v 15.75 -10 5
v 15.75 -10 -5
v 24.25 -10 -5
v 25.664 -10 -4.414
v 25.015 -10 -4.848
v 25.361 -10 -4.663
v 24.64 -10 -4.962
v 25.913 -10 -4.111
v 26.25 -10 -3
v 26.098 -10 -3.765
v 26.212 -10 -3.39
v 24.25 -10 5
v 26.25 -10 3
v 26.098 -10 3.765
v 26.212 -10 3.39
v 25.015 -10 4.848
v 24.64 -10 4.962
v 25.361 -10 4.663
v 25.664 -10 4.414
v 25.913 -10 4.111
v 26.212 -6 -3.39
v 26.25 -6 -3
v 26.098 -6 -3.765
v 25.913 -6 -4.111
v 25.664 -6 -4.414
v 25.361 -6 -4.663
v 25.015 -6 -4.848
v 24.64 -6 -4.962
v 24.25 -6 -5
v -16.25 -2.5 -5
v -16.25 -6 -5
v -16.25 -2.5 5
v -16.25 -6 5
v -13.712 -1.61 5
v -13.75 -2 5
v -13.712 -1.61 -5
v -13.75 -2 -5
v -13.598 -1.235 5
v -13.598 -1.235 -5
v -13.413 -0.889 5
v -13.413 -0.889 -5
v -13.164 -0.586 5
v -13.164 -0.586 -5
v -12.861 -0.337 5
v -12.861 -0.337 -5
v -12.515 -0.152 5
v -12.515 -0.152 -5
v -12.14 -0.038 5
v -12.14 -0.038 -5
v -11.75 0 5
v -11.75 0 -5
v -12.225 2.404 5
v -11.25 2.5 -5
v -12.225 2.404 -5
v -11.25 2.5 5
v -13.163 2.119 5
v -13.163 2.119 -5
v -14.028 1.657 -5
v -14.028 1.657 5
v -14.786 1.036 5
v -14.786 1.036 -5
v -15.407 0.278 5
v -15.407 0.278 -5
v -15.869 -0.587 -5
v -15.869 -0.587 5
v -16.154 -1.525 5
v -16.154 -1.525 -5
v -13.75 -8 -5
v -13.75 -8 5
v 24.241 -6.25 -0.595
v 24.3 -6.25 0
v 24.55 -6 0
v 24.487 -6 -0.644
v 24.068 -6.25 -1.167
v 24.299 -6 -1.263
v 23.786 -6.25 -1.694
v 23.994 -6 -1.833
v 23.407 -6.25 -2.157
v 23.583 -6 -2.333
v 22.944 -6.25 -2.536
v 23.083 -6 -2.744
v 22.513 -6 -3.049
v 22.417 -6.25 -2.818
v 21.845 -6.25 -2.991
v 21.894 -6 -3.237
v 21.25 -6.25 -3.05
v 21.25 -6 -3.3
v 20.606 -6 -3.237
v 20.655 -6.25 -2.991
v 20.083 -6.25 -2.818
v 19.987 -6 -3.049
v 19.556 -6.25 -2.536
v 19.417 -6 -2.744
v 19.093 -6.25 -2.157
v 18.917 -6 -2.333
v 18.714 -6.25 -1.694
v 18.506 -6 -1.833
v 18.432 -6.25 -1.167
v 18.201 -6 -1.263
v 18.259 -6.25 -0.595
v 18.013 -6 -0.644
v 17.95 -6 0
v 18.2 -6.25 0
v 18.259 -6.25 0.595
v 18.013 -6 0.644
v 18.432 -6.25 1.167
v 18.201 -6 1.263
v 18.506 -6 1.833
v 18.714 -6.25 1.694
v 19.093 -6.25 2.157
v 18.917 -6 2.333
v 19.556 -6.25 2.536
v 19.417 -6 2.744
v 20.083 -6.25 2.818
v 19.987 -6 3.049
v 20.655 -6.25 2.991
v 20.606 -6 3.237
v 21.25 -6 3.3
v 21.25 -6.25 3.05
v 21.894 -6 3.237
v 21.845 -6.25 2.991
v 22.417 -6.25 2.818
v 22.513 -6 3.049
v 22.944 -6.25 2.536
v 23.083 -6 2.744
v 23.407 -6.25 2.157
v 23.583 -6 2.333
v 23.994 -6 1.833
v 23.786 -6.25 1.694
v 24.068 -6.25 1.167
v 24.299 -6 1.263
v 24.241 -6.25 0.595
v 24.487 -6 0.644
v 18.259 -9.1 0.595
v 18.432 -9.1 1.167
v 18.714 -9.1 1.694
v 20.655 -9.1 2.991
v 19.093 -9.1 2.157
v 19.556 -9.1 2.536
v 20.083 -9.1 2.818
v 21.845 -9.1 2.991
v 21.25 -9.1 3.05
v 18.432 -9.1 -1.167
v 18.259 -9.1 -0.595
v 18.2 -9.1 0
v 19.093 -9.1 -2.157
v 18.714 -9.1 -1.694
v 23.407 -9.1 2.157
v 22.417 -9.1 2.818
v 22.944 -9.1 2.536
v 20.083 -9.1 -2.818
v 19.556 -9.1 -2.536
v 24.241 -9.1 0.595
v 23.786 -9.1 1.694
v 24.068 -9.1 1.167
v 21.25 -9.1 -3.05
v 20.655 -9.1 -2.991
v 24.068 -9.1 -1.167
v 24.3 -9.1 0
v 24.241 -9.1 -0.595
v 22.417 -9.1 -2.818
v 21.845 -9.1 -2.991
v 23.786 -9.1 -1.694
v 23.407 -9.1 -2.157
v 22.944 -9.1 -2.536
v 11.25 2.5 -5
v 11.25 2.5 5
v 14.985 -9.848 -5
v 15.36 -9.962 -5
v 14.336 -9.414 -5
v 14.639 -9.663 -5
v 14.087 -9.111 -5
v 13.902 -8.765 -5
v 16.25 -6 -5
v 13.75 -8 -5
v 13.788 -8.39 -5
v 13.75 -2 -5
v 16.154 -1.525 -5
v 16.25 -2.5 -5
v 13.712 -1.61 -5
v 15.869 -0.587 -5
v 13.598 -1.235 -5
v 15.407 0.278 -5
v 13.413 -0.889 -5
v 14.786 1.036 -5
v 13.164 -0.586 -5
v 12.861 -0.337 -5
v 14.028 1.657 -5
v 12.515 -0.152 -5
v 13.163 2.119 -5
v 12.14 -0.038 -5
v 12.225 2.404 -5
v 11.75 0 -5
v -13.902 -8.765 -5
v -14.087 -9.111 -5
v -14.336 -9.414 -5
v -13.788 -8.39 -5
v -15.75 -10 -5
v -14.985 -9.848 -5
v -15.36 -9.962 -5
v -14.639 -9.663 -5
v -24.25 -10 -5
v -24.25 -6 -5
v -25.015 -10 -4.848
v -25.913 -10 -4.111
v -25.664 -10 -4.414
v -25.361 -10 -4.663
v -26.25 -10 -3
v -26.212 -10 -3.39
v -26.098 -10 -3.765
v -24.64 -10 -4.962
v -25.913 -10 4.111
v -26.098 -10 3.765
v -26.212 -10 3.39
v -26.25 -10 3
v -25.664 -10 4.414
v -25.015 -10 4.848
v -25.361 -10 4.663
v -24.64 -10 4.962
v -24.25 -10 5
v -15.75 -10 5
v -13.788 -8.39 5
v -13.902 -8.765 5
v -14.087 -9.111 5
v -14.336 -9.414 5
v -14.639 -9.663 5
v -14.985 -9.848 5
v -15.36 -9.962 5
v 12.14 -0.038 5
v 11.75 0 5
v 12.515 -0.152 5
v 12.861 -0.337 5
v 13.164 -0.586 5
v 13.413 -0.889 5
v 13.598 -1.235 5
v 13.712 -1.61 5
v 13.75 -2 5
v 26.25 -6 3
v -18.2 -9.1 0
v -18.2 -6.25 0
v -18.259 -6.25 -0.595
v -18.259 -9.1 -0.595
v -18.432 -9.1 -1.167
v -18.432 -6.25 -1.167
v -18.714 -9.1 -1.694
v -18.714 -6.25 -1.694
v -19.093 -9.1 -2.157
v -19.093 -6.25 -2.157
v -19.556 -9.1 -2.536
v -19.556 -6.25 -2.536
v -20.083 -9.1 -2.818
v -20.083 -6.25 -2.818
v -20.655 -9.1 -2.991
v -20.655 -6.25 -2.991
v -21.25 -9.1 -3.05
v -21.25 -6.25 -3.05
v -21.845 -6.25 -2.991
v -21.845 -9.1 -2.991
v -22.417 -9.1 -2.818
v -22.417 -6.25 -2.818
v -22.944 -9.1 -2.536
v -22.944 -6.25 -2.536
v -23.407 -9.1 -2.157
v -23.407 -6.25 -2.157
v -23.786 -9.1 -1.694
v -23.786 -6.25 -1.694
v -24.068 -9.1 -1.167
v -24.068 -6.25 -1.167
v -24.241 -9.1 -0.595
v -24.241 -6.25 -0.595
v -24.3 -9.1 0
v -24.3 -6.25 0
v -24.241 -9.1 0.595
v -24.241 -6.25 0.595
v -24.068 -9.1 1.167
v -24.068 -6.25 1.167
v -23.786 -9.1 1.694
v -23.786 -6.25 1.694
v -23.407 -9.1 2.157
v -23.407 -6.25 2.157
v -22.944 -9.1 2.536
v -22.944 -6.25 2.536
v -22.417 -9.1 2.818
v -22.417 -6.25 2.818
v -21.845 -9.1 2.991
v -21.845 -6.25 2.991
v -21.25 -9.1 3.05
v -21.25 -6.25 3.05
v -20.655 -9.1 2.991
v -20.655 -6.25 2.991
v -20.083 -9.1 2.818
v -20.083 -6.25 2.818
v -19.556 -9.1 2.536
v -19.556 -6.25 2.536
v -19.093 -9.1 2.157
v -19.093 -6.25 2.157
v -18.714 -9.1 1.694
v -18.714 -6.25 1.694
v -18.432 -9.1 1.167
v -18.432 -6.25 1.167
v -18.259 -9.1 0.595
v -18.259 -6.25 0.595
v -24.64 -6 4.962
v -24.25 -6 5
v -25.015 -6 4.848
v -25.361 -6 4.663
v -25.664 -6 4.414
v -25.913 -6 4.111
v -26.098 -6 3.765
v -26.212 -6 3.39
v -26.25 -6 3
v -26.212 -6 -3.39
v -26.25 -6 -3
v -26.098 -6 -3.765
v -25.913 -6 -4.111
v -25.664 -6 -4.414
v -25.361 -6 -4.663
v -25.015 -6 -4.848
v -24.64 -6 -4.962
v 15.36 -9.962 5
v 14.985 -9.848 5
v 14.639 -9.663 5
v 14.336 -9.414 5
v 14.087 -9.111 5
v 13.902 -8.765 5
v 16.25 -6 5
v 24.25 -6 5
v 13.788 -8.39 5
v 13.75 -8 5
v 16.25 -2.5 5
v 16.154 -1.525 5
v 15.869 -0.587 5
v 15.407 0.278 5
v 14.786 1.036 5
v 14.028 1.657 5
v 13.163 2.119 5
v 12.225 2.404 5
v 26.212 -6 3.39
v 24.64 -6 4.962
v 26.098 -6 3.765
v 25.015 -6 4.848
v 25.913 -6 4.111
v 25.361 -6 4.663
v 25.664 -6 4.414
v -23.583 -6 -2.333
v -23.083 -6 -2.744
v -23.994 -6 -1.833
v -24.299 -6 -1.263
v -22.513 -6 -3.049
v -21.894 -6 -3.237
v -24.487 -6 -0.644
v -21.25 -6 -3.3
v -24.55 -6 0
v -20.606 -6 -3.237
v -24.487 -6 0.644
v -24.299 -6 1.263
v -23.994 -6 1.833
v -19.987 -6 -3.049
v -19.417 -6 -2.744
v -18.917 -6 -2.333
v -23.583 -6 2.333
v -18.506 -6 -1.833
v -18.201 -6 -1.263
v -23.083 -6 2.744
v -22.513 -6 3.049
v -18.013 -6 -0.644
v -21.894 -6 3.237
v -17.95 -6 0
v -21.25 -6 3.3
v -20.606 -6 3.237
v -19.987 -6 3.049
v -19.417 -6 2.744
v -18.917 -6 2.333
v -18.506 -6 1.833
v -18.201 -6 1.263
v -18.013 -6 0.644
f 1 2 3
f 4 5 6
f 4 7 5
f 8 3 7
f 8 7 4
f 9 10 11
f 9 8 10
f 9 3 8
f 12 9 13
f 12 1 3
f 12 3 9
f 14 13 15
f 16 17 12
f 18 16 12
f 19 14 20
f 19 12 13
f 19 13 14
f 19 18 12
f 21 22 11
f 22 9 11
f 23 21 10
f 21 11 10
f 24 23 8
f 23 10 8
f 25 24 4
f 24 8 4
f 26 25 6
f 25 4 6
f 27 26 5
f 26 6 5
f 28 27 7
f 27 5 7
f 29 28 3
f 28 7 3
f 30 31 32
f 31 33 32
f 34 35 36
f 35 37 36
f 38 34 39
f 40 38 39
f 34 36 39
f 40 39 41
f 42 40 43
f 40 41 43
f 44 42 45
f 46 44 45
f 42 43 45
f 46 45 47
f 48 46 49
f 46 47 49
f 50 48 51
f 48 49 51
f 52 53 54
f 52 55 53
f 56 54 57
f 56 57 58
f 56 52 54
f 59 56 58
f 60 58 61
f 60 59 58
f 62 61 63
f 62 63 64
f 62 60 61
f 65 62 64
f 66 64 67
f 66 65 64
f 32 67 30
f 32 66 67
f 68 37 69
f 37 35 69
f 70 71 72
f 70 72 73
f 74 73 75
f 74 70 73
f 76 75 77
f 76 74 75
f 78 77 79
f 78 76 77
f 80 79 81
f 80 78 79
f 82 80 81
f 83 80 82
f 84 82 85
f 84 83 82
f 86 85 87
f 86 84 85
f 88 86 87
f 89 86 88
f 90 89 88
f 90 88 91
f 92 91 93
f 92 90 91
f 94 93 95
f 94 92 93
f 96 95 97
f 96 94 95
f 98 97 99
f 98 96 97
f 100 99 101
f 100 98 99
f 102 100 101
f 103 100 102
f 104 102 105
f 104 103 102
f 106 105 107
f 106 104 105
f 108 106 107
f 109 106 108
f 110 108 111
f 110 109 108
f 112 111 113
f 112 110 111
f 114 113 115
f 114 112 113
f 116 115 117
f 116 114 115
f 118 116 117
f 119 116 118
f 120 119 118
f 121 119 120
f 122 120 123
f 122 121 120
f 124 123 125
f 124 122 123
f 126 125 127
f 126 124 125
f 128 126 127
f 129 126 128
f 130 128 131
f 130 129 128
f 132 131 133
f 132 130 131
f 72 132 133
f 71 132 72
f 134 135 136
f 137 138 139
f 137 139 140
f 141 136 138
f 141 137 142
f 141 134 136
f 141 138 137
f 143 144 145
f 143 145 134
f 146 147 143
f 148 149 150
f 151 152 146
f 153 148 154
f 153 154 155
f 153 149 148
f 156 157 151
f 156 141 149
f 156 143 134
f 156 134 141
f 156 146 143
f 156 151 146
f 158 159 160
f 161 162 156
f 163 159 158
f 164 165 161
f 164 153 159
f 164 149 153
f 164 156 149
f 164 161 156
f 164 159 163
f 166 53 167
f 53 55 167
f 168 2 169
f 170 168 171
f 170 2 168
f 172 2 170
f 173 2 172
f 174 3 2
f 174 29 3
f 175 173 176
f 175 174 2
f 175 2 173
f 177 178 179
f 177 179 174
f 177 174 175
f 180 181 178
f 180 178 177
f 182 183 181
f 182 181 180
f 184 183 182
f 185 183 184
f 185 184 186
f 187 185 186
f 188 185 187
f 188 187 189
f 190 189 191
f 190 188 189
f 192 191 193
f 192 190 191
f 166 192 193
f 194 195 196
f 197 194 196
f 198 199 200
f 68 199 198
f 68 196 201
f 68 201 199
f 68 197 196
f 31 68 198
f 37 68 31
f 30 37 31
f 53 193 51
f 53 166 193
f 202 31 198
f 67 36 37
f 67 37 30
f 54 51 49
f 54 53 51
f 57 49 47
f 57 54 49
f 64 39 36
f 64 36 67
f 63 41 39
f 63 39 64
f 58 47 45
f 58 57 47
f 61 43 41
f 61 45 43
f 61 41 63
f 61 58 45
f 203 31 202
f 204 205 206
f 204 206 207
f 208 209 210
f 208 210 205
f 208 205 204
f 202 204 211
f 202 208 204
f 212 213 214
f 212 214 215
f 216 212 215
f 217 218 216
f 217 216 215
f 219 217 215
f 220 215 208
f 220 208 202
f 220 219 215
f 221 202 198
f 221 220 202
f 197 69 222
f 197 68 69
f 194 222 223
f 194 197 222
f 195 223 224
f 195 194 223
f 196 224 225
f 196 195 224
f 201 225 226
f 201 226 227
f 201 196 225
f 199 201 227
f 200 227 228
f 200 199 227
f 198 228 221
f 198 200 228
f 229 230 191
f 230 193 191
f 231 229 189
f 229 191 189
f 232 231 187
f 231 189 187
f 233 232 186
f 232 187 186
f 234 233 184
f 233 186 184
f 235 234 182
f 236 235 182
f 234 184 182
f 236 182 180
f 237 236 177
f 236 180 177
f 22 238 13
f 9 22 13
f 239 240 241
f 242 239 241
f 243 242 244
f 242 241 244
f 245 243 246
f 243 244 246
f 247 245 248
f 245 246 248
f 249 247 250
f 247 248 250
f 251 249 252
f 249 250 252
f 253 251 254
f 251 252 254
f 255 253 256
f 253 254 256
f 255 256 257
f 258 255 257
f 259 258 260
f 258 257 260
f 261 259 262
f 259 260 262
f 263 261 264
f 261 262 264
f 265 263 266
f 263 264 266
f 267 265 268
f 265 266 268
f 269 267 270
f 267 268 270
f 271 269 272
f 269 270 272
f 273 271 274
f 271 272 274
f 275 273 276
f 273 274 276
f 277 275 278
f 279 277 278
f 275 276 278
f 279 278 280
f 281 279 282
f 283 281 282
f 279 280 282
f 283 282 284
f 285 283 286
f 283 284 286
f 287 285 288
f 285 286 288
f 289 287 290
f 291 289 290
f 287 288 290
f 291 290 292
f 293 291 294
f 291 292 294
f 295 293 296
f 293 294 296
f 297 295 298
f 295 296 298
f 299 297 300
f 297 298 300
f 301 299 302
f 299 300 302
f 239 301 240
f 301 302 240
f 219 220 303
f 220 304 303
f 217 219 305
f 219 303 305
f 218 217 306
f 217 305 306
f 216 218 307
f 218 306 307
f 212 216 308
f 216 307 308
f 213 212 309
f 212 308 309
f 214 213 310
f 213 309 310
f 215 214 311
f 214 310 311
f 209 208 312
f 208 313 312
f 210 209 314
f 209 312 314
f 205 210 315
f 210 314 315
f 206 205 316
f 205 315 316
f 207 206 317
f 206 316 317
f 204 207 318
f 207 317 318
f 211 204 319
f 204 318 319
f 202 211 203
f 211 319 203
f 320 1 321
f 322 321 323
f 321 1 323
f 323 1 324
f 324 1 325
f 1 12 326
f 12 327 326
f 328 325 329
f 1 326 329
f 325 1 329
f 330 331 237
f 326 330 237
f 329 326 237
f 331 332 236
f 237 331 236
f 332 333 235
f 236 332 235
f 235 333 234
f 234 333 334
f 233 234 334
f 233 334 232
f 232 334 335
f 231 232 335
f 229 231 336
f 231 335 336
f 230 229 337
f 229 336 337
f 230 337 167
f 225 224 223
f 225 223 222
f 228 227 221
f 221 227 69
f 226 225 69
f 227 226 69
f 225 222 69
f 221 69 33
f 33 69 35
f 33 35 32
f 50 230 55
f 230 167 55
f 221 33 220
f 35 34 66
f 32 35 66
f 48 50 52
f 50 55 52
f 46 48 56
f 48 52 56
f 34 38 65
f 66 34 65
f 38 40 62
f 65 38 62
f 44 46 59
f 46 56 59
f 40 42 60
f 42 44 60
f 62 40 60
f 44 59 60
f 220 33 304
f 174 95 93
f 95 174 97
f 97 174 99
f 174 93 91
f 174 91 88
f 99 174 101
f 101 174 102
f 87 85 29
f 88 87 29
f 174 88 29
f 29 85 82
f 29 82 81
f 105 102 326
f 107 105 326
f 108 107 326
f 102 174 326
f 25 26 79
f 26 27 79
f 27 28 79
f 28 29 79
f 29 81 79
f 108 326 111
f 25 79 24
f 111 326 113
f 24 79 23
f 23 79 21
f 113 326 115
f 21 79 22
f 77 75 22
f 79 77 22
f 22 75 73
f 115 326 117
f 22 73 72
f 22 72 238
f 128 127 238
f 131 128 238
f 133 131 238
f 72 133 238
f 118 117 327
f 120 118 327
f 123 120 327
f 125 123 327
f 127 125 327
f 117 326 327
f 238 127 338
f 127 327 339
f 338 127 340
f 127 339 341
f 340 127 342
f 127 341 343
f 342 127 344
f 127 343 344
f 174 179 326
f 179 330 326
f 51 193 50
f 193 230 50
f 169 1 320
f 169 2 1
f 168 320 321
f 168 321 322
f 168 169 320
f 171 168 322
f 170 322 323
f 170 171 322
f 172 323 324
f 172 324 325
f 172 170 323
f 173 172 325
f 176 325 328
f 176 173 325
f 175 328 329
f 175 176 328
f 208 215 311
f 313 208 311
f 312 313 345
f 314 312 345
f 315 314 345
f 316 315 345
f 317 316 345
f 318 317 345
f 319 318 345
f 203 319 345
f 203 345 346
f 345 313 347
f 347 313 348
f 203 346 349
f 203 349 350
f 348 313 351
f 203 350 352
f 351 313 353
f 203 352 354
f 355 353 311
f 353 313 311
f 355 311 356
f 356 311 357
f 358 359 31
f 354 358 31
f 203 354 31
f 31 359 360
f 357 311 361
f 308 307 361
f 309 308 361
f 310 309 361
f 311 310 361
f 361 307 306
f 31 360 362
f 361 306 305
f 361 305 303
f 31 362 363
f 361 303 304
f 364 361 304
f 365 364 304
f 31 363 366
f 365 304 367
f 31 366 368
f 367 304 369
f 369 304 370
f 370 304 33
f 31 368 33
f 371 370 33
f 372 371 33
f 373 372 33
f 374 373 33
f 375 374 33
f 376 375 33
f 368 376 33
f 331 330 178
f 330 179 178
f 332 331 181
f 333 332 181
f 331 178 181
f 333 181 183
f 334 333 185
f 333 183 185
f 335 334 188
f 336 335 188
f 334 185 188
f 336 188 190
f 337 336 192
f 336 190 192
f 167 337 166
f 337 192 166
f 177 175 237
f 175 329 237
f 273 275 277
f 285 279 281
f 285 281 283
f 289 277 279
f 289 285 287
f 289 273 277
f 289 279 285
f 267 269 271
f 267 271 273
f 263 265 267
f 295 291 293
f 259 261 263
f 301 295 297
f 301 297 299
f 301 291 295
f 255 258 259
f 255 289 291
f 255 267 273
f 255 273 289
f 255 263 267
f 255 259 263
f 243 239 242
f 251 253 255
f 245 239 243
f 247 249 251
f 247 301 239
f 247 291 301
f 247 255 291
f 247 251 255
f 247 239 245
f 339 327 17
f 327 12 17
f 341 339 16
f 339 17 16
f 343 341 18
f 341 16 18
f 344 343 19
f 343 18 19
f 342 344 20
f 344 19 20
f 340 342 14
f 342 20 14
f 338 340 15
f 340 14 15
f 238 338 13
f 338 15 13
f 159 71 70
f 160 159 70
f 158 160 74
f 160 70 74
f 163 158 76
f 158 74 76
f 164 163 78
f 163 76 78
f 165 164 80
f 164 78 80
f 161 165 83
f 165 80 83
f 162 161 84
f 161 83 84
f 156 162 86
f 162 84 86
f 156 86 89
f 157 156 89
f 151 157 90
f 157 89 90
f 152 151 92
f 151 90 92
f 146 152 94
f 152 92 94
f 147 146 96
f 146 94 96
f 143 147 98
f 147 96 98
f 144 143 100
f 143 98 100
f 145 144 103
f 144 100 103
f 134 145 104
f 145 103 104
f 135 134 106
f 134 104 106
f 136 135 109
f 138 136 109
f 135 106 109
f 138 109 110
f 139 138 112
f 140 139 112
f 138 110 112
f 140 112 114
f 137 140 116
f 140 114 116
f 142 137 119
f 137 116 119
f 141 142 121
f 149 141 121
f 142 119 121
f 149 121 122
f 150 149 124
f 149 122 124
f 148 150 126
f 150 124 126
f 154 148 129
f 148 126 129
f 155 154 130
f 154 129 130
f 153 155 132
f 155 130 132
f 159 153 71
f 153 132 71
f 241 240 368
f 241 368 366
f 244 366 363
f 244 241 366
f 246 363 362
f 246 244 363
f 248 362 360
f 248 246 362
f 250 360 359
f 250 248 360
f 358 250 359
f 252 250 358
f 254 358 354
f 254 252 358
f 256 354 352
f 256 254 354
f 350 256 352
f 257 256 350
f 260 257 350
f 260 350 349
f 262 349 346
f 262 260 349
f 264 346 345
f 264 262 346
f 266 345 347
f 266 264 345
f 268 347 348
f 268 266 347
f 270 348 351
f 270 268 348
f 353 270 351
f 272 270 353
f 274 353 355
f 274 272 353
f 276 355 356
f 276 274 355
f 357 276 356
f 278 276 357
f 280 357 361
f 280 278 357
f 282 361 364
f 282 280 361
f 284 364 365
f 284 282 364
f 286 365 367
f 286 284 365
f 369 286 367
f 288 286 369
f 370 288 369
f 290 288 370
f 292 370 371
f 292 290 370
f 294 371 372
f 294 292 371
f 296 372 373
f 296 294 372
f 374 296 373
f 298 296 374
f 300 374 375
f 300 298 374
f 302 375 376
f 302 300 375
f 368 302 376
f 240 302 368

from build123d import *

# Parameters (mm, degrees)
BOSS_EXTRUDE1_DEPTH = 5
FILLET1_R           = 2
FILLET2_R           = 5
FILLET3_R           = 2
FILLET4_R           = 2
SKETCH3_R           = 3.05
CUT_EXTRUDE1_DEPTH  = 3.1
CHAMFER1_SIZE       = 0.25


with BuildPart() as part:
    # Sketch1 → Boss-Extrude1 (new body, symmetric)
    with BuildSketch(Plane.XY):
        Polygon((-16.25, 2.5), (16.25, 2.5), (16.25, -6), (26.25, -6), (26.25, -10), (16.25, -10), (13.75, -10), (13.75, 0), (-13.75, 0), (-13.75, -10), (-16.25, -10), (-26.25, -10), (-26.25, -6), (-16.25, -6), align=None)
    extrude(amount=BOSS_EXTRUDE1_DEPTH, both=True)

    # Fillet1
    fillet1_edges = [part.edges().sort_by_distance(p)[0] for p in [
        (13.75, 0, 0),
        (-13.75, 0, 0),
    ]]
    fillet(fillet1_edges, radius=FILLET1_R)

    # Fillet2
    fillet2_edges = [part.edges().sort_by_distance(p)[0] for p in [
        (-16.25, 2.5, 0),
        (16.25, 2.5, 0),
    ]]
    fillet(fillet2_edges, radius=FILLET2_R)

    # Fillet3
    fillet3_edges = [part.edges().sort_by_distance(p)[0] for p in [
        (26.25, -8, -5),
        (-26.25, -8, -5),
        (-26.25, -8, 5),
        (26.25, -8, 5),
    ]]
    fillet(fillet3_edges, radius=FILLET3_R)

    # Fillet4
    fillet4_edges = [part.edges().sort_by_distance(p)[0] for p in [
        (13.75, -10, 0),
        (-13.75, -10, 0),
    ]]
    fillet(fillet4_edges, radius=FILLET4_R)

    # Sketch3 → Cut-Extrude1 (cut)
    with BuildSketch(Plane(origin=(0, -6, 0), x_dir=(1, 0, 0), z_dir=(0, 1, 0))):
        with Locations((21.25, 0)):
            Circle(SKETCH3_R)
        with Locations((-21.25, 0)):
            Circle(SKETCH3_R)
    extrude(amount=-CUT_EXTRUDE1_DEPTH, mode=Mode.SUBTRACT)

    # Chamfer1
    chamfer1_edges = [part.edges().sort_by_distance(p)[0] for p in [
        (18.2, -6, 0),
        (-24.3, -6, 0),
    ]]
    chamfer(chamfer1_edges, length=CHAMFER1_SIZE)


solid = part.part
